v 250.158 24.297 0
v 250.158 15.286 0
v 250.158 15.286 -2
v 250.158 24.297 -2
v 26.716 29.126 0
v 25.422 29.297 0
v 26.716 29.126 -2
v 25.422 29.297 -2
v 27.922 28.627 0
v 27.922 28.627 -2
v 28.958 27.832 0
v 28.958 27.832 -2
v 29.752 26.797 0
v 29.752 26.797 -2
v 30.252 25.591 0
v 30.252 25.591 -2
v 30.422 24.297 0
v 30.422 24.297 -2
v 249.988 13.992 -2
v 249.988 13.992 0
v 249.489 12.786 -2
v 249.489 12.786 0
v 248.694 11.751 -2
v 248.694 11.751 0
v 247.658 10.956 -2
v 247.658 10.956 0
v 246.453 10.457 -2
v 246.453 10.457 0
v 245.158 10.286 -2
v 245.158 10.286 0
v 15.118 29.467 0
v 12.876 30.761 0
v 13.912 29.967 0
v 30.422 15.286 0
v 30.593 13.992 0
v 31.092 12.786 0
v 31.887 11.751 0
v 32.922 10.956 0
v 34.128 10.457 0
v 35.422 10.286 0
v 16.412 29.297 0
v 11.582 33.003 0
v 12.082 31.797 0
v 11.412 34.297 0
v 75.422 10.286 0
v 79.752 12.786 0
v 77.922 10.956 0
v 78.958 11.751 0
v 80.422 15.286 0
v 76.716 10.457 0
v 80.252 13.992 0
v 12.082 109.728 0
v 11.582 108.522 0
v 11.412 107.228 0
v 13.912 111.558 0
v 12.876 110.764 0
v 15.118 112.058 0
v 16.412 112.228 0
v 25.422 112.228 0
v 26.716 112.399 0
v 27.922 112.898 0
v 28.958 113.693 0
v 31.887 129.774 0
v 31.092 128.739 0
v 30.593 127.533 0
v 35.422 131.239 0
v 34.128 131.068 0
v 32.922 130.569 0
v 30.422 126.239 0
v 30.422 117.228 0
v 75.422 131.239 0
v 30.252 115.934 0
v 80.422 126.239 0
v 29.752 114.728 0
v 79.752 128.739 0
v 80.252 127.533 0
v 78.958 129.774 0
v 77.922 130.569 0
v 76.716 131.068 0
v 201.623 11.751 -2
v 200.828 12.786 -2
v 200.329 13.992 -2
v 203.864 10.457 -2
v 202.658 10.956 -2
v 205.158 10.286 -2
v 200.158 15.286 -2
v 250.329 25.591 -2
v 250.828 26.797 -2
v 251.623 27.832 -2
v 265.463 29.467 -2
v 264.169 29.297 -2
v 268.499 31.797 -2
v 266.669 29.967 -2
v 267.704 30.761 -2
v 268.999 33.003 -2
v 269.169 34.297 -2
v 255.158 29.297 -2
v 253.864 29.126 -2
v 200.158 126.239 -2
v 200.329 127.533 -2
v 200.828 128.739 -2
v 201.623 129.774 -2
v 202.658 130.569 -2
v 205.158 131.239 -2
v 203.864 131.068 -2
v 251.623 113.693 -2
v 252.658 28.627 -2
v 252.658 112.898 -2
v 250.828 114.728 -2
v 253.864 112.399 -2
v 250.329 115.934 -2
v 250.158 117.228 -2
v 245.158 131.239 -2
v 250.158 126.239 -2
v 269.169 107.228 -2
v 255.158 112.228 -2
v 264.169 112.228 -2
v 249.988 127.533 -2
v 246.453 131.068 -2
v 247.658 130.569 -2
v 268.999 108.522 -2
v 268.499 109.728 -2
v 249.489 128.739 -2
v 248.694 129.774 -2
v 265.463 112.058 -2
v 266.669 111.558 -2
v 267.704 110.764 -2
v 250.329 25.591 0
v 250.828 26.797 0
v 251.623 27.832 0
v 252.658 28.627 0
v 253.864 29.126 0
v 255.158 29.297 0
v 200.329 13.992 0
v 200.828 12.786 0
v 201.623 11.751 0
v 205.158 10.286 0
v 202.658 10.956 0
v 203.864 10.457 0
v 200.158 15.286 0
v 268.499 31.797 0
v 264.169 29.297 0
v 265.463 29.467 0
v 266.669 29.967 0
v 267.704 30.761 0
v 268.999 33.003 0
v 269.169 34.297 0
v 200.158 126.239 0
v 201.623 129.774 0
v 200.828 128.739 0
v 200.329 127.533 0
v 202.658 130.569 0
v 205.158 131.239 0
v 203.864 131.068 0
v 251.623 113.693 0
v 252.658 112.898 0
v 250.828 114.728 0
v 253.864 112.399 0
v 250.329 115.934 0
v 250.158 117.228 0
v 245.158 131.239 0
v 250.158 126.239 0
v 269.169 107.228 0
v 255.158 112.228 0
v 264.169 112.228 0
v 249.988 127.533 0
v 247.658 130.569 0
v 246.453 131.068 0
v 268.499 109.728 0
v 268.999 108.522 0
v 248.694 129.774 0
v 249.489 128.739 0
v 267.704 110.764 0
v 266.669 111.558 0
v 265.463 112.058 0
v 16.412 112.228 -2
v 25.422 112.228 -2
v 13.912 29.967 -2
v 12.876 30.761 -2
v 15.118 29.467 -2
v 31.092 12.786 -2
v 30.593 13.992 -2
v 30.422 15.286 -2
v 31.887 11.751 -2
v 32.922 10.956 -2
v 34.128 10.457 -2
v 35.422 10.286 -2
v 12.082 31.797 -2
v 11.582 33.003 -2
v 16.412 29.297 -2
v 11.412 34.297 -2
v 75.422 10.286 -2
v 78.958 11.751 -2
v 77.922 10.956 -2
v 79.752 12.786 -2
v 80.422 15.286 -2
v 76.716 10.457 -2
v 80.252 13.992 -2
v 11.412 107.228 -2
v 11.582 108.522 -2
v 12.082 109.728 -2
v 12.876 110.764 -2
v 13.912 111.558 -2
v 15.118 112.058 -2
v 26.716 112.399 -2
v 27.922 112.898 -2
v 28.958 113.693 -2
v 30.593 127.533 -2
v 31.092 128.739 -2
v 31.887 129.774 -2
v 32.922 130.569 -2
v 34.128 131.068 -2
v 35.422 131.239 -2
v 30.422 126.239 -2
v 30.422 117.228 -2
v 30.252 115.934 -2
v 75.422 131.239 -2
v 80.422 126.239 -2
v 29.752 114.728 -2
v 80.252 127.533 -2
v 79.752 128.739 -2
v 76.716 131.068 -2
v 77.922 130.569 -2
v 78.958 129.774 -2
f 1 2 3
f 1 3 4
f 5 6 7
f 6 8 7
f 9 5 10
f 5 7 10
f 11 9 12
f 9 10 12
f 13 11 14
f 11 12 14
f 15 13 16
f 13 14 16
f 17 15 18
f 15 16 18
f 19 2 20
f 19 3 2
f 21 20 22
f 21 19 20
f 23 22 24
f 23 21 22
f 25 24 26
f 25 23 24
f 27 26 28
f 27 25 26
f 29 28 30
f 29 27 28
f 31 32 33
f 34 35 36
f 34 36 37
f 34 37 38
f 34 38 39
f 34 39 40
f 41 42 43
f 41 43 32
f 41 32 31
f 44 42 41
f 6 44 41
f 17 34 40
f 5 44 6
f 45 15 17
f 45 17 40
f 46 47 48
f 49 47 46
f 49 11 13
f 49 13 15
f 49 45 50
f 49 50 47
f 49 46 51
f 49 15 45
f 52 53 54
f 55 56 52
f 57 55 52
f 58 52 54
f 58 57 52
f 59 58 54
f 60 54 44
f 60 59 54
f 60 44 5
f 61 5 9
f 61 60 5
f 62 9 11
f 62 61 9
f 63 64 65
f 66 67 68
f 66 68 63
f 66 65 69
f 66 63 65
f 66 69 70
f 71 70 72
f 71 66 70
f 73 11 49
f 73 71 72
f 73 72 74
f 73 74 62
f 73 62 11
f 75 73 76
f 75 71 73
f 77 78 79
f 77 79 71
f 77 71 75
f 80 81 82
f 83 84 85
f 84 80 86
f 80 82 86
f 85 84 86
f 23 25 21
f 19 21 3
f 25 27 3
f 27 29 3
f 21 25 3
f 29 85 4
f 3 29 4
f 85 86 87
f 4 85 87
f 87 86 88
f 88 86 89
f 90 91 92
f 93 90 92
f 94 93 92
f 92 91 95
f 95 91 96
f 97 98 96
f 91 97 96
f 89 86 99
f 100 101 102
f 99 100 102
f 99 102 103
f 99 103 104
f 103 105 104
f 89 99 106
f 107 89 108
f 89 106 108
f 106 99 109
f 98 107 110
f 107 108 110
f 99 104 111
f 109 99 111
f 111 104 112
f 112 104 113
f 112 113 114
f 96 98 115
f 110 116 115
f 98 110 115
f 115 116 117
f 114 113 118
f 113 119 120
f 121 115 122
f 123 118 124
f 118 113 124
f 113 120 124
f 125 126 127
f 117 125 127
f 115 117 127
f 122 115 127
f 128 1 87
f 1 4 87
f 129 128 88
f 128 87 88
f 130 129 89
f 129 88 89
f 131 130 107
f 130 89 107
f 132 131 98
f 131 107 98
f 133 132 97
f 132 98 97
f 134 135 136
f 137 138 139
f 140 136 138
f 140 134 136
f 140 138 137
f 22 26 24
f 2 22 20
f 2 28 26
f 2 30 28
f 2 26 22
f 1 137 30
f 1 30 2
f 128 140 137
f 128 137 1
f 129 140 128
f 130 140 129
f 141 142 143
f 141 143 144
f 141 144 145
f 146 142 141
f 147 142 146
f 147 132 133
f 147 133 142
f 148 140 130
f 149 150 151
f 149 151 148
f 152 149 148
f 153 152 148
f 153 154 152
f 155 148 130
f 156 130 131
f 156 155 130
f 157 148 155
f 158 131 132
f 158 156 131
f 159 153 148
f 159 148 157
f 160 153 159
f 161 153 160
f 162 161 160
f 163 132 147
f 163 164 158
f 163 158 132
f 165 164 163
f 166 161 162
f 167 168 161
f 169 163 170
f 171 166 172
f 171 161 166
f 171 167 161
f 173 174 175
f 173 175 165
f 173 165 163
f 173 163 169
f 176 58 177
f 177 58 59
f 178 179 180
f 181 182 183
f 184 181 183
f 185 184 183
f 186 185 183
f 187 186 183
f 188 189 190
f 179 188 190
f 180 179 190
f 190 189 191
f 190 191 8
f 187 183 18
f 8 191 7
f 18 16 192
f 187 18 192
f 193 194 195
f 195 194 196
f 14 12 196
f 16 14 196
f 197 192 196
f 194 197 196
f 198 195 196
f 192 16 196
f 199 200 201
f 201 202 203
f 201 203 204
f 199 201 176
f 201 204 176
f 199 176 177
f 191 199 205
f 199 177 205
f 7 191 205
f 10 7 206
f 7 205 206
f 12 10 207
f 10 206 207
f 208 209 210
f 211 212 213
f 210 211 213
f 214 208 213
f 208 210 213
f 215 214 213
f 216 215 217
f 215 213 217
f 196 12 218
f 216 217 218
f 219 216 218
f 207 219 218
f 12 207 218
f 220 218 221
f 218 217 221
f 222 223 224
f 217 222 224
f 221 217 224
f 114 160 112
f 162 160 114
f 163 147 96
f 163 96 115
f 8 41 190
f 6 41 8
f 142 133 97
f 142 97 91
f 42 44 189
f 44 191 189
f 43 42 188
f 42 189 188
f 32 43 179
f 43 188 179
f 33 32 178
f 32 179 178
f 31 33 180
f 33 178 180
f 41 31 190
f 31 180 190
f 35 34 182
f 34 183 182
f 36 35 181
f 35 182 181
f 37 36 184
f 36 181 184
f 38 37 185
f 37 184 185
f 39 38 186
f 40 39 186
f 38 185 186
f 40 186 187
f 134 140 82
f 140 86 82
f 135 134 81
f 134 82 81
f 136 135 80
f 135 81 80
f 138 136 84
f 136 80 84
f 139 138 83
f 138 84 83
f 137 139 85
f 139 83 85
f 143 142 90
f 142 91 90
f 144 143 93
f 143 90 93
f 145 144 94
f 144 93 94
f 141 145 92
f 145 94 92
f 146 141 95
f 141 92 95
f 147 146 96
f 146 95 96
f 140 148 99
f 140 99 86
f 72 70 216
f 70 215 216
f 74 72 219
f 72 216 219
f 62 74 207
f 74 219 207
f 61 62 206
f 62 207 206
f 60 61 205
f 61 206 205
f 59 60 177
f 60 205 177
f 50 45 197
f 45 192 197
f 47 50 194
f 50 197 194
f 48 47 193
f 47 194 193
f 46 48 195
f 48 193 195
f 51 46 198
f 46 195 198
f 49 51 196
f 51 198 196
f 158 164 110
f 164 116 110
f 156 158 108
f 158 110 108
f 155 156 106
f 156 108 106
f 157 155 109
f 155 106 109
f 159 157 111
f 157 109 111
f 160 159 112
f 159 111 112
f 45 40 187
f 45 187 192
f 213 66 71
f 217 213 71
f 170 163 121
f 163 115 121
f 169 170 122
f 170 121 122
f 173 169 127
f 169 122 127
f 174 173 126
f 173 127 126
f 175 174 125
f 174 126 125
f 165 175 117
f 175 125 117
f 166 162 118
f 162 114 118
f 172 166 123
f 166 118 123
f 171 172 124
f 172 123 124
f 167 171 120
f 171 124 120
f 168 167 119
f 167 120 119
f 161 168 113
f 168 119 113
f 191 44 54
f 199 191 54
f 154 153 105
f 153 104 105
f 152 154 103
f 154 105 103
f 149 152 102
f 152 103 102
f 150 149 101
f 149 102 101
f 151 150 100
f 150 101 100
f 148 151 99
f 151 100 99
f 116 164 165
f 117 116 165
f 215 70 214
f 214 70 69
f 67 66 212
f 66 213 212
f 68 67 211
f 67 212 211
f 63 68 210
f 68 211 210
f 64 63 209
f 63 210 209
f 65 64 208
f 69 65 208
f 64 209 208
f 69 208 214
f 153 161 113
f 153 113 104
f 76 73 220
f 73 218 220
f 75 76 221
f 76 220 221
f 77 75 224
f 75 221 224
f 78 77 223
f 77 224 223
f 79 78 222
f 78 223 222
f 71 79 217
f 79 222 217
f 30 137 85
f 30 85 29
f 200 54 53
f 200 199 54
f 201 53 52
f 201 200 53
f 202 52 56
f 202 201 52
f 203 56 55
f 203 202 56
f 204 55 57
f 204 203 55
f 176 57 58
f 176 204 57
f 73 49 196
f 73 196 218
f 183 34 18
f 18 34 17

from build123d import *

# Parameters (mm, degrees)
BOSS_EXTRUDE1_DEPTH   = 2
BOSS_EXTRUDE1_2_DEPTH = 2
FILLET1_R             = 5
FILLET2_R             = 5


with BuildPart() as part:
    # Sketch24 → Boss-Extrude1 (new body)
    with BuildSketch(Plane.XY):
        Polygon((30.42227205, 29.296782196), (30.42227205, 10.286374556), (80.42227205, 10.286374556), (80.42227205, 131.238694526), (30.42227205, 131.238694526), (30.42227205, 112.228286886), (11.41186441, 112.228286886), (11.41186441, 29.296782196), align=None)
    extrude(amount=-BOSS_EXTRUDE1_DEPTH)

    # Fillet1
    fillet1_edges = [part.edges().sort_by_distance(p)[0] for p in [
        (11.41186441, 29.296782196, -1),
        (30.42227205, 29.296782196, -1),
        (30.42227205, 10.286374556, -1),
        (80.42227205, 10.286374556, -1),
        (80.42227205, 131.238694526, -1),
        (30.42227205, 131.238694526, -1),
        (30.42227205, 112.228286886, -1),
        (11.41186441, 112.228286886, -1),
    ]]
    fillet(fillet1_edges, radius=FILLET1_R)


with BuildPart() as body_2:
    # Sketch24 → Boss-Extrude1 2 (new body)
    with BuildSketch(Plane.XY):
        Polygon((269.168886442, 112.228286886), (250.158478802, 112.228286886), (250.158478802, 131.238694526), (200.158478802, 131.238694526), (200.158478802, 10.286374556), (250.158478802, 10.286374556), (250.158478802, 29.296782196), (269.168886442, 29.296782196), align=None)
    extrude(amount=-BOSS_EXTRUDE1_2_DEPTH)

    # Fillet2
    fillet2_edges = [body_2.edges().sort_by_distance(p)[0] for p in [
        (200.158478802, 131.238694526, -1),
        (250.158478802, 131.238694526, -1),
        (250.158478802, 112.228286886, -1),
        (269.168886442, 112.228286886, -1),
        (250.158478802, 29.296782196, -1),
        (269.168886442, 29.296782196, -1),
        (250.158478802, 10.286374556, -1),
        (200.158478802, 10.286374556, -1),
    ]]
    fillet(fillet2_edges, radius=FILLET2_R)


solid = Compound([part.part, body_2.part])
